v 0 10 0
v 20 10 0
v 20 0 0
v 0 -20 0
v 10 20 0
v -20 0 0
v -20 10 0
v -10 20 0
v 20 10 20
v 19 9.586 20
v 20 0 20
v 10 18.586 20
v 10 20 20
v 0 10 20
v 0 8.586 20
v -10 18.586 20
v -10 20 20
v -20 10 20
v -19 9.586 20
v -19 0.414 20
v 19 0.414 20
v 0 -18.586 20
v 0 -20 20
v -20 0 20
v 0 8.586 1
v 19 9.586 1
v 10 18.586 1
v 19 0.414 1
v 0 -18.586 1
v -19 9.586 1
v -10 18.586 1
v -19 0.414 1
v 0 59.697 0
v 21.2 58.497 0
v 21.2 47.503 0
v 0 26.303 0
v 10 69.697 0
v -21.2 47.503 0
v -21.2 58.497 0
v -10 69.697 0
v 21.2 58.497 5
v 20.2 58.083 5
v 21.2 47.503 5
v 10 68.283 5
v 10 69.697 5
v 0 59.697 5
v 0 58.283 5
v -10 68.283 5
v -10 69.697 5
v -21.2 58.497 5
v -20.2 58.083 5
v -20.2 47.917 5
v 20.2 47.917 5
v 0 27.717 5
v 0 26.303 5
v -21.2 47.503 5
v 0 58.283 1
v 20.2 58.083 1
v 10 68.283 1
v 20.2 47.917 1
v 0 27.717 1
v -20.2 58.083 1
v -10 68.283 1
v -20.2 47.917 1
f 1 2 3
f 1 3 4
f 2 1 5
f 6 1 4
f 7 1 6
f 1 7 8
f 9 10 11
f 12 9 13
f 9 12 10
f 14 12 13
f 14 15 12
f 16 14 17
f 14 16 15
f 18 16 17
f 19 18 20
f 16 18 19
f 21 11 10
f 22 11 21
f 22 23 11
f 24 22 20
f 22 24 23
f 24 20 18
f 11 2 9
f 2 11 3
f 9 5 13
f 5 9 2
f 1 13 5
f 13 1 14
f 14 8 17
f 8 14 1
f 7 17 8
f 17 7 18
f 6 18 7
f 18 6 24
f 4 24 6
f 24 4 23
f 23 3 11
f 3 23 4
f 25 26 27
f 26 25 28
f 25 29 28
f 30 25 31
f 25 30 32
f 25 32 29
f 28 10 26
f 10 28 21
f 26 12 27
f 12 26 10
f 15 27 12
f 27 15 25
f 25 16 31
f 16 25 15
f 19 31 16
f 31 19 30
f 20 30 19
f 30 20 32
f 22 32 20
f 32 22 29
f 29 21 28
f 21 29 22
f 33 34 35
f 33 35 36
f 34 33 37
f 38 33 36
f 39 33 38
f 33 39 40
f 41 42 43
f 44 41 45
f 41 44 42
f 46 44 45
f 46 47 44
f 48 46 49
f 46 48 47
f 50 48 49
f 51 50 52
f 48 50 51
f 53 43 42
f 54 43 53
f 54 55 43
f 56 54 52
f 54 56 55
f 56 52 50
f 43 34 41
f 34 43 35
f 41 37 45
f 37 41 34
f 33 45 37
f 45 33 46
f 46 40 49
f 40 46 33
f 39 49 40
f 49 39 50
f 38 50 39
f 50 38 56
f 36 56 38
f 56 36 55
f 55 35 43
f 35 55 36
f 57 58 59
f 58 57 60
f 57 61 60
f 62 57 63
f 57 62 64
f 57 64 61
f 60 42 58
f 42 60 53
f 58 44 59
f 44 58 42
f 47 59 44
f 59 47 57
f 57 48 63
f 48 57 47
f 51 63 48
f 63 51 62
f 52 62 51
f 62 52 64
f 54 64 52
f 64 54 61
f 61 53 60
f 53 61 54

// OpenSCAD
//[Parametric Heart Box v.1]
//Written by Hermes Alvarado
//<hermesalvarado@gmail.com>

//Definitions:
size = 40; //total width and length of box
height = 20; //total height of box
thickness = 1; //wall thickness
bottomthickness = 1;
lidheight = 5;
tolerance = 0.2; //tolerance between box and lid


//Calculations
module heart(){
    polygon([[0,-size/2],[size/2,0],[size/2,size/4],[size/4,size/2],[0,size/4],[-size/4,size/2],[-size/2,size/4],[-size/2,0]],[[0,1,2,3,4,5,6,7]],10);
};
module innerheart(){
    offset(delta=-thickness){
        polygon([[0,-size/2],[size/2,0],[size/2,size/4],[size/4,size/2],[0,size/4],[-size/4,size/2],[-size/2,size/4],[-size/2,0]],[[0,1,2,3,4,5,6,7]],10);
    }
};
module heartbox(){
    difference(){
        linear_extrude(height=height,center=false,convexity=10,twist=0){
            heart();
        }
        translate([0,0,bottomthickness]){
            linear_extrude(height=height-bottomthickness,center=false,convexity=10,twist=0){
                innerheart();
            }
        }
    }
};
module heartboxlid(){
    translate([0,size*1.2,0]){
        difference(){
            linear_extrude(height=lidheight,center=false,convexity=10,twist=0){
                offset(delta=thickness+tolerance){
                    heart();
                }
            }
            translate([0,0,bottomthickness]){
            linear_extrude(height=lidheight-bottomthickness,center=false,convexity=10,twist=0){
                offset(delta=thickness+tolerance){
                    innerheart();
                }
            }
        }
        }
    }
};
heartbox();
heartboxlid();
